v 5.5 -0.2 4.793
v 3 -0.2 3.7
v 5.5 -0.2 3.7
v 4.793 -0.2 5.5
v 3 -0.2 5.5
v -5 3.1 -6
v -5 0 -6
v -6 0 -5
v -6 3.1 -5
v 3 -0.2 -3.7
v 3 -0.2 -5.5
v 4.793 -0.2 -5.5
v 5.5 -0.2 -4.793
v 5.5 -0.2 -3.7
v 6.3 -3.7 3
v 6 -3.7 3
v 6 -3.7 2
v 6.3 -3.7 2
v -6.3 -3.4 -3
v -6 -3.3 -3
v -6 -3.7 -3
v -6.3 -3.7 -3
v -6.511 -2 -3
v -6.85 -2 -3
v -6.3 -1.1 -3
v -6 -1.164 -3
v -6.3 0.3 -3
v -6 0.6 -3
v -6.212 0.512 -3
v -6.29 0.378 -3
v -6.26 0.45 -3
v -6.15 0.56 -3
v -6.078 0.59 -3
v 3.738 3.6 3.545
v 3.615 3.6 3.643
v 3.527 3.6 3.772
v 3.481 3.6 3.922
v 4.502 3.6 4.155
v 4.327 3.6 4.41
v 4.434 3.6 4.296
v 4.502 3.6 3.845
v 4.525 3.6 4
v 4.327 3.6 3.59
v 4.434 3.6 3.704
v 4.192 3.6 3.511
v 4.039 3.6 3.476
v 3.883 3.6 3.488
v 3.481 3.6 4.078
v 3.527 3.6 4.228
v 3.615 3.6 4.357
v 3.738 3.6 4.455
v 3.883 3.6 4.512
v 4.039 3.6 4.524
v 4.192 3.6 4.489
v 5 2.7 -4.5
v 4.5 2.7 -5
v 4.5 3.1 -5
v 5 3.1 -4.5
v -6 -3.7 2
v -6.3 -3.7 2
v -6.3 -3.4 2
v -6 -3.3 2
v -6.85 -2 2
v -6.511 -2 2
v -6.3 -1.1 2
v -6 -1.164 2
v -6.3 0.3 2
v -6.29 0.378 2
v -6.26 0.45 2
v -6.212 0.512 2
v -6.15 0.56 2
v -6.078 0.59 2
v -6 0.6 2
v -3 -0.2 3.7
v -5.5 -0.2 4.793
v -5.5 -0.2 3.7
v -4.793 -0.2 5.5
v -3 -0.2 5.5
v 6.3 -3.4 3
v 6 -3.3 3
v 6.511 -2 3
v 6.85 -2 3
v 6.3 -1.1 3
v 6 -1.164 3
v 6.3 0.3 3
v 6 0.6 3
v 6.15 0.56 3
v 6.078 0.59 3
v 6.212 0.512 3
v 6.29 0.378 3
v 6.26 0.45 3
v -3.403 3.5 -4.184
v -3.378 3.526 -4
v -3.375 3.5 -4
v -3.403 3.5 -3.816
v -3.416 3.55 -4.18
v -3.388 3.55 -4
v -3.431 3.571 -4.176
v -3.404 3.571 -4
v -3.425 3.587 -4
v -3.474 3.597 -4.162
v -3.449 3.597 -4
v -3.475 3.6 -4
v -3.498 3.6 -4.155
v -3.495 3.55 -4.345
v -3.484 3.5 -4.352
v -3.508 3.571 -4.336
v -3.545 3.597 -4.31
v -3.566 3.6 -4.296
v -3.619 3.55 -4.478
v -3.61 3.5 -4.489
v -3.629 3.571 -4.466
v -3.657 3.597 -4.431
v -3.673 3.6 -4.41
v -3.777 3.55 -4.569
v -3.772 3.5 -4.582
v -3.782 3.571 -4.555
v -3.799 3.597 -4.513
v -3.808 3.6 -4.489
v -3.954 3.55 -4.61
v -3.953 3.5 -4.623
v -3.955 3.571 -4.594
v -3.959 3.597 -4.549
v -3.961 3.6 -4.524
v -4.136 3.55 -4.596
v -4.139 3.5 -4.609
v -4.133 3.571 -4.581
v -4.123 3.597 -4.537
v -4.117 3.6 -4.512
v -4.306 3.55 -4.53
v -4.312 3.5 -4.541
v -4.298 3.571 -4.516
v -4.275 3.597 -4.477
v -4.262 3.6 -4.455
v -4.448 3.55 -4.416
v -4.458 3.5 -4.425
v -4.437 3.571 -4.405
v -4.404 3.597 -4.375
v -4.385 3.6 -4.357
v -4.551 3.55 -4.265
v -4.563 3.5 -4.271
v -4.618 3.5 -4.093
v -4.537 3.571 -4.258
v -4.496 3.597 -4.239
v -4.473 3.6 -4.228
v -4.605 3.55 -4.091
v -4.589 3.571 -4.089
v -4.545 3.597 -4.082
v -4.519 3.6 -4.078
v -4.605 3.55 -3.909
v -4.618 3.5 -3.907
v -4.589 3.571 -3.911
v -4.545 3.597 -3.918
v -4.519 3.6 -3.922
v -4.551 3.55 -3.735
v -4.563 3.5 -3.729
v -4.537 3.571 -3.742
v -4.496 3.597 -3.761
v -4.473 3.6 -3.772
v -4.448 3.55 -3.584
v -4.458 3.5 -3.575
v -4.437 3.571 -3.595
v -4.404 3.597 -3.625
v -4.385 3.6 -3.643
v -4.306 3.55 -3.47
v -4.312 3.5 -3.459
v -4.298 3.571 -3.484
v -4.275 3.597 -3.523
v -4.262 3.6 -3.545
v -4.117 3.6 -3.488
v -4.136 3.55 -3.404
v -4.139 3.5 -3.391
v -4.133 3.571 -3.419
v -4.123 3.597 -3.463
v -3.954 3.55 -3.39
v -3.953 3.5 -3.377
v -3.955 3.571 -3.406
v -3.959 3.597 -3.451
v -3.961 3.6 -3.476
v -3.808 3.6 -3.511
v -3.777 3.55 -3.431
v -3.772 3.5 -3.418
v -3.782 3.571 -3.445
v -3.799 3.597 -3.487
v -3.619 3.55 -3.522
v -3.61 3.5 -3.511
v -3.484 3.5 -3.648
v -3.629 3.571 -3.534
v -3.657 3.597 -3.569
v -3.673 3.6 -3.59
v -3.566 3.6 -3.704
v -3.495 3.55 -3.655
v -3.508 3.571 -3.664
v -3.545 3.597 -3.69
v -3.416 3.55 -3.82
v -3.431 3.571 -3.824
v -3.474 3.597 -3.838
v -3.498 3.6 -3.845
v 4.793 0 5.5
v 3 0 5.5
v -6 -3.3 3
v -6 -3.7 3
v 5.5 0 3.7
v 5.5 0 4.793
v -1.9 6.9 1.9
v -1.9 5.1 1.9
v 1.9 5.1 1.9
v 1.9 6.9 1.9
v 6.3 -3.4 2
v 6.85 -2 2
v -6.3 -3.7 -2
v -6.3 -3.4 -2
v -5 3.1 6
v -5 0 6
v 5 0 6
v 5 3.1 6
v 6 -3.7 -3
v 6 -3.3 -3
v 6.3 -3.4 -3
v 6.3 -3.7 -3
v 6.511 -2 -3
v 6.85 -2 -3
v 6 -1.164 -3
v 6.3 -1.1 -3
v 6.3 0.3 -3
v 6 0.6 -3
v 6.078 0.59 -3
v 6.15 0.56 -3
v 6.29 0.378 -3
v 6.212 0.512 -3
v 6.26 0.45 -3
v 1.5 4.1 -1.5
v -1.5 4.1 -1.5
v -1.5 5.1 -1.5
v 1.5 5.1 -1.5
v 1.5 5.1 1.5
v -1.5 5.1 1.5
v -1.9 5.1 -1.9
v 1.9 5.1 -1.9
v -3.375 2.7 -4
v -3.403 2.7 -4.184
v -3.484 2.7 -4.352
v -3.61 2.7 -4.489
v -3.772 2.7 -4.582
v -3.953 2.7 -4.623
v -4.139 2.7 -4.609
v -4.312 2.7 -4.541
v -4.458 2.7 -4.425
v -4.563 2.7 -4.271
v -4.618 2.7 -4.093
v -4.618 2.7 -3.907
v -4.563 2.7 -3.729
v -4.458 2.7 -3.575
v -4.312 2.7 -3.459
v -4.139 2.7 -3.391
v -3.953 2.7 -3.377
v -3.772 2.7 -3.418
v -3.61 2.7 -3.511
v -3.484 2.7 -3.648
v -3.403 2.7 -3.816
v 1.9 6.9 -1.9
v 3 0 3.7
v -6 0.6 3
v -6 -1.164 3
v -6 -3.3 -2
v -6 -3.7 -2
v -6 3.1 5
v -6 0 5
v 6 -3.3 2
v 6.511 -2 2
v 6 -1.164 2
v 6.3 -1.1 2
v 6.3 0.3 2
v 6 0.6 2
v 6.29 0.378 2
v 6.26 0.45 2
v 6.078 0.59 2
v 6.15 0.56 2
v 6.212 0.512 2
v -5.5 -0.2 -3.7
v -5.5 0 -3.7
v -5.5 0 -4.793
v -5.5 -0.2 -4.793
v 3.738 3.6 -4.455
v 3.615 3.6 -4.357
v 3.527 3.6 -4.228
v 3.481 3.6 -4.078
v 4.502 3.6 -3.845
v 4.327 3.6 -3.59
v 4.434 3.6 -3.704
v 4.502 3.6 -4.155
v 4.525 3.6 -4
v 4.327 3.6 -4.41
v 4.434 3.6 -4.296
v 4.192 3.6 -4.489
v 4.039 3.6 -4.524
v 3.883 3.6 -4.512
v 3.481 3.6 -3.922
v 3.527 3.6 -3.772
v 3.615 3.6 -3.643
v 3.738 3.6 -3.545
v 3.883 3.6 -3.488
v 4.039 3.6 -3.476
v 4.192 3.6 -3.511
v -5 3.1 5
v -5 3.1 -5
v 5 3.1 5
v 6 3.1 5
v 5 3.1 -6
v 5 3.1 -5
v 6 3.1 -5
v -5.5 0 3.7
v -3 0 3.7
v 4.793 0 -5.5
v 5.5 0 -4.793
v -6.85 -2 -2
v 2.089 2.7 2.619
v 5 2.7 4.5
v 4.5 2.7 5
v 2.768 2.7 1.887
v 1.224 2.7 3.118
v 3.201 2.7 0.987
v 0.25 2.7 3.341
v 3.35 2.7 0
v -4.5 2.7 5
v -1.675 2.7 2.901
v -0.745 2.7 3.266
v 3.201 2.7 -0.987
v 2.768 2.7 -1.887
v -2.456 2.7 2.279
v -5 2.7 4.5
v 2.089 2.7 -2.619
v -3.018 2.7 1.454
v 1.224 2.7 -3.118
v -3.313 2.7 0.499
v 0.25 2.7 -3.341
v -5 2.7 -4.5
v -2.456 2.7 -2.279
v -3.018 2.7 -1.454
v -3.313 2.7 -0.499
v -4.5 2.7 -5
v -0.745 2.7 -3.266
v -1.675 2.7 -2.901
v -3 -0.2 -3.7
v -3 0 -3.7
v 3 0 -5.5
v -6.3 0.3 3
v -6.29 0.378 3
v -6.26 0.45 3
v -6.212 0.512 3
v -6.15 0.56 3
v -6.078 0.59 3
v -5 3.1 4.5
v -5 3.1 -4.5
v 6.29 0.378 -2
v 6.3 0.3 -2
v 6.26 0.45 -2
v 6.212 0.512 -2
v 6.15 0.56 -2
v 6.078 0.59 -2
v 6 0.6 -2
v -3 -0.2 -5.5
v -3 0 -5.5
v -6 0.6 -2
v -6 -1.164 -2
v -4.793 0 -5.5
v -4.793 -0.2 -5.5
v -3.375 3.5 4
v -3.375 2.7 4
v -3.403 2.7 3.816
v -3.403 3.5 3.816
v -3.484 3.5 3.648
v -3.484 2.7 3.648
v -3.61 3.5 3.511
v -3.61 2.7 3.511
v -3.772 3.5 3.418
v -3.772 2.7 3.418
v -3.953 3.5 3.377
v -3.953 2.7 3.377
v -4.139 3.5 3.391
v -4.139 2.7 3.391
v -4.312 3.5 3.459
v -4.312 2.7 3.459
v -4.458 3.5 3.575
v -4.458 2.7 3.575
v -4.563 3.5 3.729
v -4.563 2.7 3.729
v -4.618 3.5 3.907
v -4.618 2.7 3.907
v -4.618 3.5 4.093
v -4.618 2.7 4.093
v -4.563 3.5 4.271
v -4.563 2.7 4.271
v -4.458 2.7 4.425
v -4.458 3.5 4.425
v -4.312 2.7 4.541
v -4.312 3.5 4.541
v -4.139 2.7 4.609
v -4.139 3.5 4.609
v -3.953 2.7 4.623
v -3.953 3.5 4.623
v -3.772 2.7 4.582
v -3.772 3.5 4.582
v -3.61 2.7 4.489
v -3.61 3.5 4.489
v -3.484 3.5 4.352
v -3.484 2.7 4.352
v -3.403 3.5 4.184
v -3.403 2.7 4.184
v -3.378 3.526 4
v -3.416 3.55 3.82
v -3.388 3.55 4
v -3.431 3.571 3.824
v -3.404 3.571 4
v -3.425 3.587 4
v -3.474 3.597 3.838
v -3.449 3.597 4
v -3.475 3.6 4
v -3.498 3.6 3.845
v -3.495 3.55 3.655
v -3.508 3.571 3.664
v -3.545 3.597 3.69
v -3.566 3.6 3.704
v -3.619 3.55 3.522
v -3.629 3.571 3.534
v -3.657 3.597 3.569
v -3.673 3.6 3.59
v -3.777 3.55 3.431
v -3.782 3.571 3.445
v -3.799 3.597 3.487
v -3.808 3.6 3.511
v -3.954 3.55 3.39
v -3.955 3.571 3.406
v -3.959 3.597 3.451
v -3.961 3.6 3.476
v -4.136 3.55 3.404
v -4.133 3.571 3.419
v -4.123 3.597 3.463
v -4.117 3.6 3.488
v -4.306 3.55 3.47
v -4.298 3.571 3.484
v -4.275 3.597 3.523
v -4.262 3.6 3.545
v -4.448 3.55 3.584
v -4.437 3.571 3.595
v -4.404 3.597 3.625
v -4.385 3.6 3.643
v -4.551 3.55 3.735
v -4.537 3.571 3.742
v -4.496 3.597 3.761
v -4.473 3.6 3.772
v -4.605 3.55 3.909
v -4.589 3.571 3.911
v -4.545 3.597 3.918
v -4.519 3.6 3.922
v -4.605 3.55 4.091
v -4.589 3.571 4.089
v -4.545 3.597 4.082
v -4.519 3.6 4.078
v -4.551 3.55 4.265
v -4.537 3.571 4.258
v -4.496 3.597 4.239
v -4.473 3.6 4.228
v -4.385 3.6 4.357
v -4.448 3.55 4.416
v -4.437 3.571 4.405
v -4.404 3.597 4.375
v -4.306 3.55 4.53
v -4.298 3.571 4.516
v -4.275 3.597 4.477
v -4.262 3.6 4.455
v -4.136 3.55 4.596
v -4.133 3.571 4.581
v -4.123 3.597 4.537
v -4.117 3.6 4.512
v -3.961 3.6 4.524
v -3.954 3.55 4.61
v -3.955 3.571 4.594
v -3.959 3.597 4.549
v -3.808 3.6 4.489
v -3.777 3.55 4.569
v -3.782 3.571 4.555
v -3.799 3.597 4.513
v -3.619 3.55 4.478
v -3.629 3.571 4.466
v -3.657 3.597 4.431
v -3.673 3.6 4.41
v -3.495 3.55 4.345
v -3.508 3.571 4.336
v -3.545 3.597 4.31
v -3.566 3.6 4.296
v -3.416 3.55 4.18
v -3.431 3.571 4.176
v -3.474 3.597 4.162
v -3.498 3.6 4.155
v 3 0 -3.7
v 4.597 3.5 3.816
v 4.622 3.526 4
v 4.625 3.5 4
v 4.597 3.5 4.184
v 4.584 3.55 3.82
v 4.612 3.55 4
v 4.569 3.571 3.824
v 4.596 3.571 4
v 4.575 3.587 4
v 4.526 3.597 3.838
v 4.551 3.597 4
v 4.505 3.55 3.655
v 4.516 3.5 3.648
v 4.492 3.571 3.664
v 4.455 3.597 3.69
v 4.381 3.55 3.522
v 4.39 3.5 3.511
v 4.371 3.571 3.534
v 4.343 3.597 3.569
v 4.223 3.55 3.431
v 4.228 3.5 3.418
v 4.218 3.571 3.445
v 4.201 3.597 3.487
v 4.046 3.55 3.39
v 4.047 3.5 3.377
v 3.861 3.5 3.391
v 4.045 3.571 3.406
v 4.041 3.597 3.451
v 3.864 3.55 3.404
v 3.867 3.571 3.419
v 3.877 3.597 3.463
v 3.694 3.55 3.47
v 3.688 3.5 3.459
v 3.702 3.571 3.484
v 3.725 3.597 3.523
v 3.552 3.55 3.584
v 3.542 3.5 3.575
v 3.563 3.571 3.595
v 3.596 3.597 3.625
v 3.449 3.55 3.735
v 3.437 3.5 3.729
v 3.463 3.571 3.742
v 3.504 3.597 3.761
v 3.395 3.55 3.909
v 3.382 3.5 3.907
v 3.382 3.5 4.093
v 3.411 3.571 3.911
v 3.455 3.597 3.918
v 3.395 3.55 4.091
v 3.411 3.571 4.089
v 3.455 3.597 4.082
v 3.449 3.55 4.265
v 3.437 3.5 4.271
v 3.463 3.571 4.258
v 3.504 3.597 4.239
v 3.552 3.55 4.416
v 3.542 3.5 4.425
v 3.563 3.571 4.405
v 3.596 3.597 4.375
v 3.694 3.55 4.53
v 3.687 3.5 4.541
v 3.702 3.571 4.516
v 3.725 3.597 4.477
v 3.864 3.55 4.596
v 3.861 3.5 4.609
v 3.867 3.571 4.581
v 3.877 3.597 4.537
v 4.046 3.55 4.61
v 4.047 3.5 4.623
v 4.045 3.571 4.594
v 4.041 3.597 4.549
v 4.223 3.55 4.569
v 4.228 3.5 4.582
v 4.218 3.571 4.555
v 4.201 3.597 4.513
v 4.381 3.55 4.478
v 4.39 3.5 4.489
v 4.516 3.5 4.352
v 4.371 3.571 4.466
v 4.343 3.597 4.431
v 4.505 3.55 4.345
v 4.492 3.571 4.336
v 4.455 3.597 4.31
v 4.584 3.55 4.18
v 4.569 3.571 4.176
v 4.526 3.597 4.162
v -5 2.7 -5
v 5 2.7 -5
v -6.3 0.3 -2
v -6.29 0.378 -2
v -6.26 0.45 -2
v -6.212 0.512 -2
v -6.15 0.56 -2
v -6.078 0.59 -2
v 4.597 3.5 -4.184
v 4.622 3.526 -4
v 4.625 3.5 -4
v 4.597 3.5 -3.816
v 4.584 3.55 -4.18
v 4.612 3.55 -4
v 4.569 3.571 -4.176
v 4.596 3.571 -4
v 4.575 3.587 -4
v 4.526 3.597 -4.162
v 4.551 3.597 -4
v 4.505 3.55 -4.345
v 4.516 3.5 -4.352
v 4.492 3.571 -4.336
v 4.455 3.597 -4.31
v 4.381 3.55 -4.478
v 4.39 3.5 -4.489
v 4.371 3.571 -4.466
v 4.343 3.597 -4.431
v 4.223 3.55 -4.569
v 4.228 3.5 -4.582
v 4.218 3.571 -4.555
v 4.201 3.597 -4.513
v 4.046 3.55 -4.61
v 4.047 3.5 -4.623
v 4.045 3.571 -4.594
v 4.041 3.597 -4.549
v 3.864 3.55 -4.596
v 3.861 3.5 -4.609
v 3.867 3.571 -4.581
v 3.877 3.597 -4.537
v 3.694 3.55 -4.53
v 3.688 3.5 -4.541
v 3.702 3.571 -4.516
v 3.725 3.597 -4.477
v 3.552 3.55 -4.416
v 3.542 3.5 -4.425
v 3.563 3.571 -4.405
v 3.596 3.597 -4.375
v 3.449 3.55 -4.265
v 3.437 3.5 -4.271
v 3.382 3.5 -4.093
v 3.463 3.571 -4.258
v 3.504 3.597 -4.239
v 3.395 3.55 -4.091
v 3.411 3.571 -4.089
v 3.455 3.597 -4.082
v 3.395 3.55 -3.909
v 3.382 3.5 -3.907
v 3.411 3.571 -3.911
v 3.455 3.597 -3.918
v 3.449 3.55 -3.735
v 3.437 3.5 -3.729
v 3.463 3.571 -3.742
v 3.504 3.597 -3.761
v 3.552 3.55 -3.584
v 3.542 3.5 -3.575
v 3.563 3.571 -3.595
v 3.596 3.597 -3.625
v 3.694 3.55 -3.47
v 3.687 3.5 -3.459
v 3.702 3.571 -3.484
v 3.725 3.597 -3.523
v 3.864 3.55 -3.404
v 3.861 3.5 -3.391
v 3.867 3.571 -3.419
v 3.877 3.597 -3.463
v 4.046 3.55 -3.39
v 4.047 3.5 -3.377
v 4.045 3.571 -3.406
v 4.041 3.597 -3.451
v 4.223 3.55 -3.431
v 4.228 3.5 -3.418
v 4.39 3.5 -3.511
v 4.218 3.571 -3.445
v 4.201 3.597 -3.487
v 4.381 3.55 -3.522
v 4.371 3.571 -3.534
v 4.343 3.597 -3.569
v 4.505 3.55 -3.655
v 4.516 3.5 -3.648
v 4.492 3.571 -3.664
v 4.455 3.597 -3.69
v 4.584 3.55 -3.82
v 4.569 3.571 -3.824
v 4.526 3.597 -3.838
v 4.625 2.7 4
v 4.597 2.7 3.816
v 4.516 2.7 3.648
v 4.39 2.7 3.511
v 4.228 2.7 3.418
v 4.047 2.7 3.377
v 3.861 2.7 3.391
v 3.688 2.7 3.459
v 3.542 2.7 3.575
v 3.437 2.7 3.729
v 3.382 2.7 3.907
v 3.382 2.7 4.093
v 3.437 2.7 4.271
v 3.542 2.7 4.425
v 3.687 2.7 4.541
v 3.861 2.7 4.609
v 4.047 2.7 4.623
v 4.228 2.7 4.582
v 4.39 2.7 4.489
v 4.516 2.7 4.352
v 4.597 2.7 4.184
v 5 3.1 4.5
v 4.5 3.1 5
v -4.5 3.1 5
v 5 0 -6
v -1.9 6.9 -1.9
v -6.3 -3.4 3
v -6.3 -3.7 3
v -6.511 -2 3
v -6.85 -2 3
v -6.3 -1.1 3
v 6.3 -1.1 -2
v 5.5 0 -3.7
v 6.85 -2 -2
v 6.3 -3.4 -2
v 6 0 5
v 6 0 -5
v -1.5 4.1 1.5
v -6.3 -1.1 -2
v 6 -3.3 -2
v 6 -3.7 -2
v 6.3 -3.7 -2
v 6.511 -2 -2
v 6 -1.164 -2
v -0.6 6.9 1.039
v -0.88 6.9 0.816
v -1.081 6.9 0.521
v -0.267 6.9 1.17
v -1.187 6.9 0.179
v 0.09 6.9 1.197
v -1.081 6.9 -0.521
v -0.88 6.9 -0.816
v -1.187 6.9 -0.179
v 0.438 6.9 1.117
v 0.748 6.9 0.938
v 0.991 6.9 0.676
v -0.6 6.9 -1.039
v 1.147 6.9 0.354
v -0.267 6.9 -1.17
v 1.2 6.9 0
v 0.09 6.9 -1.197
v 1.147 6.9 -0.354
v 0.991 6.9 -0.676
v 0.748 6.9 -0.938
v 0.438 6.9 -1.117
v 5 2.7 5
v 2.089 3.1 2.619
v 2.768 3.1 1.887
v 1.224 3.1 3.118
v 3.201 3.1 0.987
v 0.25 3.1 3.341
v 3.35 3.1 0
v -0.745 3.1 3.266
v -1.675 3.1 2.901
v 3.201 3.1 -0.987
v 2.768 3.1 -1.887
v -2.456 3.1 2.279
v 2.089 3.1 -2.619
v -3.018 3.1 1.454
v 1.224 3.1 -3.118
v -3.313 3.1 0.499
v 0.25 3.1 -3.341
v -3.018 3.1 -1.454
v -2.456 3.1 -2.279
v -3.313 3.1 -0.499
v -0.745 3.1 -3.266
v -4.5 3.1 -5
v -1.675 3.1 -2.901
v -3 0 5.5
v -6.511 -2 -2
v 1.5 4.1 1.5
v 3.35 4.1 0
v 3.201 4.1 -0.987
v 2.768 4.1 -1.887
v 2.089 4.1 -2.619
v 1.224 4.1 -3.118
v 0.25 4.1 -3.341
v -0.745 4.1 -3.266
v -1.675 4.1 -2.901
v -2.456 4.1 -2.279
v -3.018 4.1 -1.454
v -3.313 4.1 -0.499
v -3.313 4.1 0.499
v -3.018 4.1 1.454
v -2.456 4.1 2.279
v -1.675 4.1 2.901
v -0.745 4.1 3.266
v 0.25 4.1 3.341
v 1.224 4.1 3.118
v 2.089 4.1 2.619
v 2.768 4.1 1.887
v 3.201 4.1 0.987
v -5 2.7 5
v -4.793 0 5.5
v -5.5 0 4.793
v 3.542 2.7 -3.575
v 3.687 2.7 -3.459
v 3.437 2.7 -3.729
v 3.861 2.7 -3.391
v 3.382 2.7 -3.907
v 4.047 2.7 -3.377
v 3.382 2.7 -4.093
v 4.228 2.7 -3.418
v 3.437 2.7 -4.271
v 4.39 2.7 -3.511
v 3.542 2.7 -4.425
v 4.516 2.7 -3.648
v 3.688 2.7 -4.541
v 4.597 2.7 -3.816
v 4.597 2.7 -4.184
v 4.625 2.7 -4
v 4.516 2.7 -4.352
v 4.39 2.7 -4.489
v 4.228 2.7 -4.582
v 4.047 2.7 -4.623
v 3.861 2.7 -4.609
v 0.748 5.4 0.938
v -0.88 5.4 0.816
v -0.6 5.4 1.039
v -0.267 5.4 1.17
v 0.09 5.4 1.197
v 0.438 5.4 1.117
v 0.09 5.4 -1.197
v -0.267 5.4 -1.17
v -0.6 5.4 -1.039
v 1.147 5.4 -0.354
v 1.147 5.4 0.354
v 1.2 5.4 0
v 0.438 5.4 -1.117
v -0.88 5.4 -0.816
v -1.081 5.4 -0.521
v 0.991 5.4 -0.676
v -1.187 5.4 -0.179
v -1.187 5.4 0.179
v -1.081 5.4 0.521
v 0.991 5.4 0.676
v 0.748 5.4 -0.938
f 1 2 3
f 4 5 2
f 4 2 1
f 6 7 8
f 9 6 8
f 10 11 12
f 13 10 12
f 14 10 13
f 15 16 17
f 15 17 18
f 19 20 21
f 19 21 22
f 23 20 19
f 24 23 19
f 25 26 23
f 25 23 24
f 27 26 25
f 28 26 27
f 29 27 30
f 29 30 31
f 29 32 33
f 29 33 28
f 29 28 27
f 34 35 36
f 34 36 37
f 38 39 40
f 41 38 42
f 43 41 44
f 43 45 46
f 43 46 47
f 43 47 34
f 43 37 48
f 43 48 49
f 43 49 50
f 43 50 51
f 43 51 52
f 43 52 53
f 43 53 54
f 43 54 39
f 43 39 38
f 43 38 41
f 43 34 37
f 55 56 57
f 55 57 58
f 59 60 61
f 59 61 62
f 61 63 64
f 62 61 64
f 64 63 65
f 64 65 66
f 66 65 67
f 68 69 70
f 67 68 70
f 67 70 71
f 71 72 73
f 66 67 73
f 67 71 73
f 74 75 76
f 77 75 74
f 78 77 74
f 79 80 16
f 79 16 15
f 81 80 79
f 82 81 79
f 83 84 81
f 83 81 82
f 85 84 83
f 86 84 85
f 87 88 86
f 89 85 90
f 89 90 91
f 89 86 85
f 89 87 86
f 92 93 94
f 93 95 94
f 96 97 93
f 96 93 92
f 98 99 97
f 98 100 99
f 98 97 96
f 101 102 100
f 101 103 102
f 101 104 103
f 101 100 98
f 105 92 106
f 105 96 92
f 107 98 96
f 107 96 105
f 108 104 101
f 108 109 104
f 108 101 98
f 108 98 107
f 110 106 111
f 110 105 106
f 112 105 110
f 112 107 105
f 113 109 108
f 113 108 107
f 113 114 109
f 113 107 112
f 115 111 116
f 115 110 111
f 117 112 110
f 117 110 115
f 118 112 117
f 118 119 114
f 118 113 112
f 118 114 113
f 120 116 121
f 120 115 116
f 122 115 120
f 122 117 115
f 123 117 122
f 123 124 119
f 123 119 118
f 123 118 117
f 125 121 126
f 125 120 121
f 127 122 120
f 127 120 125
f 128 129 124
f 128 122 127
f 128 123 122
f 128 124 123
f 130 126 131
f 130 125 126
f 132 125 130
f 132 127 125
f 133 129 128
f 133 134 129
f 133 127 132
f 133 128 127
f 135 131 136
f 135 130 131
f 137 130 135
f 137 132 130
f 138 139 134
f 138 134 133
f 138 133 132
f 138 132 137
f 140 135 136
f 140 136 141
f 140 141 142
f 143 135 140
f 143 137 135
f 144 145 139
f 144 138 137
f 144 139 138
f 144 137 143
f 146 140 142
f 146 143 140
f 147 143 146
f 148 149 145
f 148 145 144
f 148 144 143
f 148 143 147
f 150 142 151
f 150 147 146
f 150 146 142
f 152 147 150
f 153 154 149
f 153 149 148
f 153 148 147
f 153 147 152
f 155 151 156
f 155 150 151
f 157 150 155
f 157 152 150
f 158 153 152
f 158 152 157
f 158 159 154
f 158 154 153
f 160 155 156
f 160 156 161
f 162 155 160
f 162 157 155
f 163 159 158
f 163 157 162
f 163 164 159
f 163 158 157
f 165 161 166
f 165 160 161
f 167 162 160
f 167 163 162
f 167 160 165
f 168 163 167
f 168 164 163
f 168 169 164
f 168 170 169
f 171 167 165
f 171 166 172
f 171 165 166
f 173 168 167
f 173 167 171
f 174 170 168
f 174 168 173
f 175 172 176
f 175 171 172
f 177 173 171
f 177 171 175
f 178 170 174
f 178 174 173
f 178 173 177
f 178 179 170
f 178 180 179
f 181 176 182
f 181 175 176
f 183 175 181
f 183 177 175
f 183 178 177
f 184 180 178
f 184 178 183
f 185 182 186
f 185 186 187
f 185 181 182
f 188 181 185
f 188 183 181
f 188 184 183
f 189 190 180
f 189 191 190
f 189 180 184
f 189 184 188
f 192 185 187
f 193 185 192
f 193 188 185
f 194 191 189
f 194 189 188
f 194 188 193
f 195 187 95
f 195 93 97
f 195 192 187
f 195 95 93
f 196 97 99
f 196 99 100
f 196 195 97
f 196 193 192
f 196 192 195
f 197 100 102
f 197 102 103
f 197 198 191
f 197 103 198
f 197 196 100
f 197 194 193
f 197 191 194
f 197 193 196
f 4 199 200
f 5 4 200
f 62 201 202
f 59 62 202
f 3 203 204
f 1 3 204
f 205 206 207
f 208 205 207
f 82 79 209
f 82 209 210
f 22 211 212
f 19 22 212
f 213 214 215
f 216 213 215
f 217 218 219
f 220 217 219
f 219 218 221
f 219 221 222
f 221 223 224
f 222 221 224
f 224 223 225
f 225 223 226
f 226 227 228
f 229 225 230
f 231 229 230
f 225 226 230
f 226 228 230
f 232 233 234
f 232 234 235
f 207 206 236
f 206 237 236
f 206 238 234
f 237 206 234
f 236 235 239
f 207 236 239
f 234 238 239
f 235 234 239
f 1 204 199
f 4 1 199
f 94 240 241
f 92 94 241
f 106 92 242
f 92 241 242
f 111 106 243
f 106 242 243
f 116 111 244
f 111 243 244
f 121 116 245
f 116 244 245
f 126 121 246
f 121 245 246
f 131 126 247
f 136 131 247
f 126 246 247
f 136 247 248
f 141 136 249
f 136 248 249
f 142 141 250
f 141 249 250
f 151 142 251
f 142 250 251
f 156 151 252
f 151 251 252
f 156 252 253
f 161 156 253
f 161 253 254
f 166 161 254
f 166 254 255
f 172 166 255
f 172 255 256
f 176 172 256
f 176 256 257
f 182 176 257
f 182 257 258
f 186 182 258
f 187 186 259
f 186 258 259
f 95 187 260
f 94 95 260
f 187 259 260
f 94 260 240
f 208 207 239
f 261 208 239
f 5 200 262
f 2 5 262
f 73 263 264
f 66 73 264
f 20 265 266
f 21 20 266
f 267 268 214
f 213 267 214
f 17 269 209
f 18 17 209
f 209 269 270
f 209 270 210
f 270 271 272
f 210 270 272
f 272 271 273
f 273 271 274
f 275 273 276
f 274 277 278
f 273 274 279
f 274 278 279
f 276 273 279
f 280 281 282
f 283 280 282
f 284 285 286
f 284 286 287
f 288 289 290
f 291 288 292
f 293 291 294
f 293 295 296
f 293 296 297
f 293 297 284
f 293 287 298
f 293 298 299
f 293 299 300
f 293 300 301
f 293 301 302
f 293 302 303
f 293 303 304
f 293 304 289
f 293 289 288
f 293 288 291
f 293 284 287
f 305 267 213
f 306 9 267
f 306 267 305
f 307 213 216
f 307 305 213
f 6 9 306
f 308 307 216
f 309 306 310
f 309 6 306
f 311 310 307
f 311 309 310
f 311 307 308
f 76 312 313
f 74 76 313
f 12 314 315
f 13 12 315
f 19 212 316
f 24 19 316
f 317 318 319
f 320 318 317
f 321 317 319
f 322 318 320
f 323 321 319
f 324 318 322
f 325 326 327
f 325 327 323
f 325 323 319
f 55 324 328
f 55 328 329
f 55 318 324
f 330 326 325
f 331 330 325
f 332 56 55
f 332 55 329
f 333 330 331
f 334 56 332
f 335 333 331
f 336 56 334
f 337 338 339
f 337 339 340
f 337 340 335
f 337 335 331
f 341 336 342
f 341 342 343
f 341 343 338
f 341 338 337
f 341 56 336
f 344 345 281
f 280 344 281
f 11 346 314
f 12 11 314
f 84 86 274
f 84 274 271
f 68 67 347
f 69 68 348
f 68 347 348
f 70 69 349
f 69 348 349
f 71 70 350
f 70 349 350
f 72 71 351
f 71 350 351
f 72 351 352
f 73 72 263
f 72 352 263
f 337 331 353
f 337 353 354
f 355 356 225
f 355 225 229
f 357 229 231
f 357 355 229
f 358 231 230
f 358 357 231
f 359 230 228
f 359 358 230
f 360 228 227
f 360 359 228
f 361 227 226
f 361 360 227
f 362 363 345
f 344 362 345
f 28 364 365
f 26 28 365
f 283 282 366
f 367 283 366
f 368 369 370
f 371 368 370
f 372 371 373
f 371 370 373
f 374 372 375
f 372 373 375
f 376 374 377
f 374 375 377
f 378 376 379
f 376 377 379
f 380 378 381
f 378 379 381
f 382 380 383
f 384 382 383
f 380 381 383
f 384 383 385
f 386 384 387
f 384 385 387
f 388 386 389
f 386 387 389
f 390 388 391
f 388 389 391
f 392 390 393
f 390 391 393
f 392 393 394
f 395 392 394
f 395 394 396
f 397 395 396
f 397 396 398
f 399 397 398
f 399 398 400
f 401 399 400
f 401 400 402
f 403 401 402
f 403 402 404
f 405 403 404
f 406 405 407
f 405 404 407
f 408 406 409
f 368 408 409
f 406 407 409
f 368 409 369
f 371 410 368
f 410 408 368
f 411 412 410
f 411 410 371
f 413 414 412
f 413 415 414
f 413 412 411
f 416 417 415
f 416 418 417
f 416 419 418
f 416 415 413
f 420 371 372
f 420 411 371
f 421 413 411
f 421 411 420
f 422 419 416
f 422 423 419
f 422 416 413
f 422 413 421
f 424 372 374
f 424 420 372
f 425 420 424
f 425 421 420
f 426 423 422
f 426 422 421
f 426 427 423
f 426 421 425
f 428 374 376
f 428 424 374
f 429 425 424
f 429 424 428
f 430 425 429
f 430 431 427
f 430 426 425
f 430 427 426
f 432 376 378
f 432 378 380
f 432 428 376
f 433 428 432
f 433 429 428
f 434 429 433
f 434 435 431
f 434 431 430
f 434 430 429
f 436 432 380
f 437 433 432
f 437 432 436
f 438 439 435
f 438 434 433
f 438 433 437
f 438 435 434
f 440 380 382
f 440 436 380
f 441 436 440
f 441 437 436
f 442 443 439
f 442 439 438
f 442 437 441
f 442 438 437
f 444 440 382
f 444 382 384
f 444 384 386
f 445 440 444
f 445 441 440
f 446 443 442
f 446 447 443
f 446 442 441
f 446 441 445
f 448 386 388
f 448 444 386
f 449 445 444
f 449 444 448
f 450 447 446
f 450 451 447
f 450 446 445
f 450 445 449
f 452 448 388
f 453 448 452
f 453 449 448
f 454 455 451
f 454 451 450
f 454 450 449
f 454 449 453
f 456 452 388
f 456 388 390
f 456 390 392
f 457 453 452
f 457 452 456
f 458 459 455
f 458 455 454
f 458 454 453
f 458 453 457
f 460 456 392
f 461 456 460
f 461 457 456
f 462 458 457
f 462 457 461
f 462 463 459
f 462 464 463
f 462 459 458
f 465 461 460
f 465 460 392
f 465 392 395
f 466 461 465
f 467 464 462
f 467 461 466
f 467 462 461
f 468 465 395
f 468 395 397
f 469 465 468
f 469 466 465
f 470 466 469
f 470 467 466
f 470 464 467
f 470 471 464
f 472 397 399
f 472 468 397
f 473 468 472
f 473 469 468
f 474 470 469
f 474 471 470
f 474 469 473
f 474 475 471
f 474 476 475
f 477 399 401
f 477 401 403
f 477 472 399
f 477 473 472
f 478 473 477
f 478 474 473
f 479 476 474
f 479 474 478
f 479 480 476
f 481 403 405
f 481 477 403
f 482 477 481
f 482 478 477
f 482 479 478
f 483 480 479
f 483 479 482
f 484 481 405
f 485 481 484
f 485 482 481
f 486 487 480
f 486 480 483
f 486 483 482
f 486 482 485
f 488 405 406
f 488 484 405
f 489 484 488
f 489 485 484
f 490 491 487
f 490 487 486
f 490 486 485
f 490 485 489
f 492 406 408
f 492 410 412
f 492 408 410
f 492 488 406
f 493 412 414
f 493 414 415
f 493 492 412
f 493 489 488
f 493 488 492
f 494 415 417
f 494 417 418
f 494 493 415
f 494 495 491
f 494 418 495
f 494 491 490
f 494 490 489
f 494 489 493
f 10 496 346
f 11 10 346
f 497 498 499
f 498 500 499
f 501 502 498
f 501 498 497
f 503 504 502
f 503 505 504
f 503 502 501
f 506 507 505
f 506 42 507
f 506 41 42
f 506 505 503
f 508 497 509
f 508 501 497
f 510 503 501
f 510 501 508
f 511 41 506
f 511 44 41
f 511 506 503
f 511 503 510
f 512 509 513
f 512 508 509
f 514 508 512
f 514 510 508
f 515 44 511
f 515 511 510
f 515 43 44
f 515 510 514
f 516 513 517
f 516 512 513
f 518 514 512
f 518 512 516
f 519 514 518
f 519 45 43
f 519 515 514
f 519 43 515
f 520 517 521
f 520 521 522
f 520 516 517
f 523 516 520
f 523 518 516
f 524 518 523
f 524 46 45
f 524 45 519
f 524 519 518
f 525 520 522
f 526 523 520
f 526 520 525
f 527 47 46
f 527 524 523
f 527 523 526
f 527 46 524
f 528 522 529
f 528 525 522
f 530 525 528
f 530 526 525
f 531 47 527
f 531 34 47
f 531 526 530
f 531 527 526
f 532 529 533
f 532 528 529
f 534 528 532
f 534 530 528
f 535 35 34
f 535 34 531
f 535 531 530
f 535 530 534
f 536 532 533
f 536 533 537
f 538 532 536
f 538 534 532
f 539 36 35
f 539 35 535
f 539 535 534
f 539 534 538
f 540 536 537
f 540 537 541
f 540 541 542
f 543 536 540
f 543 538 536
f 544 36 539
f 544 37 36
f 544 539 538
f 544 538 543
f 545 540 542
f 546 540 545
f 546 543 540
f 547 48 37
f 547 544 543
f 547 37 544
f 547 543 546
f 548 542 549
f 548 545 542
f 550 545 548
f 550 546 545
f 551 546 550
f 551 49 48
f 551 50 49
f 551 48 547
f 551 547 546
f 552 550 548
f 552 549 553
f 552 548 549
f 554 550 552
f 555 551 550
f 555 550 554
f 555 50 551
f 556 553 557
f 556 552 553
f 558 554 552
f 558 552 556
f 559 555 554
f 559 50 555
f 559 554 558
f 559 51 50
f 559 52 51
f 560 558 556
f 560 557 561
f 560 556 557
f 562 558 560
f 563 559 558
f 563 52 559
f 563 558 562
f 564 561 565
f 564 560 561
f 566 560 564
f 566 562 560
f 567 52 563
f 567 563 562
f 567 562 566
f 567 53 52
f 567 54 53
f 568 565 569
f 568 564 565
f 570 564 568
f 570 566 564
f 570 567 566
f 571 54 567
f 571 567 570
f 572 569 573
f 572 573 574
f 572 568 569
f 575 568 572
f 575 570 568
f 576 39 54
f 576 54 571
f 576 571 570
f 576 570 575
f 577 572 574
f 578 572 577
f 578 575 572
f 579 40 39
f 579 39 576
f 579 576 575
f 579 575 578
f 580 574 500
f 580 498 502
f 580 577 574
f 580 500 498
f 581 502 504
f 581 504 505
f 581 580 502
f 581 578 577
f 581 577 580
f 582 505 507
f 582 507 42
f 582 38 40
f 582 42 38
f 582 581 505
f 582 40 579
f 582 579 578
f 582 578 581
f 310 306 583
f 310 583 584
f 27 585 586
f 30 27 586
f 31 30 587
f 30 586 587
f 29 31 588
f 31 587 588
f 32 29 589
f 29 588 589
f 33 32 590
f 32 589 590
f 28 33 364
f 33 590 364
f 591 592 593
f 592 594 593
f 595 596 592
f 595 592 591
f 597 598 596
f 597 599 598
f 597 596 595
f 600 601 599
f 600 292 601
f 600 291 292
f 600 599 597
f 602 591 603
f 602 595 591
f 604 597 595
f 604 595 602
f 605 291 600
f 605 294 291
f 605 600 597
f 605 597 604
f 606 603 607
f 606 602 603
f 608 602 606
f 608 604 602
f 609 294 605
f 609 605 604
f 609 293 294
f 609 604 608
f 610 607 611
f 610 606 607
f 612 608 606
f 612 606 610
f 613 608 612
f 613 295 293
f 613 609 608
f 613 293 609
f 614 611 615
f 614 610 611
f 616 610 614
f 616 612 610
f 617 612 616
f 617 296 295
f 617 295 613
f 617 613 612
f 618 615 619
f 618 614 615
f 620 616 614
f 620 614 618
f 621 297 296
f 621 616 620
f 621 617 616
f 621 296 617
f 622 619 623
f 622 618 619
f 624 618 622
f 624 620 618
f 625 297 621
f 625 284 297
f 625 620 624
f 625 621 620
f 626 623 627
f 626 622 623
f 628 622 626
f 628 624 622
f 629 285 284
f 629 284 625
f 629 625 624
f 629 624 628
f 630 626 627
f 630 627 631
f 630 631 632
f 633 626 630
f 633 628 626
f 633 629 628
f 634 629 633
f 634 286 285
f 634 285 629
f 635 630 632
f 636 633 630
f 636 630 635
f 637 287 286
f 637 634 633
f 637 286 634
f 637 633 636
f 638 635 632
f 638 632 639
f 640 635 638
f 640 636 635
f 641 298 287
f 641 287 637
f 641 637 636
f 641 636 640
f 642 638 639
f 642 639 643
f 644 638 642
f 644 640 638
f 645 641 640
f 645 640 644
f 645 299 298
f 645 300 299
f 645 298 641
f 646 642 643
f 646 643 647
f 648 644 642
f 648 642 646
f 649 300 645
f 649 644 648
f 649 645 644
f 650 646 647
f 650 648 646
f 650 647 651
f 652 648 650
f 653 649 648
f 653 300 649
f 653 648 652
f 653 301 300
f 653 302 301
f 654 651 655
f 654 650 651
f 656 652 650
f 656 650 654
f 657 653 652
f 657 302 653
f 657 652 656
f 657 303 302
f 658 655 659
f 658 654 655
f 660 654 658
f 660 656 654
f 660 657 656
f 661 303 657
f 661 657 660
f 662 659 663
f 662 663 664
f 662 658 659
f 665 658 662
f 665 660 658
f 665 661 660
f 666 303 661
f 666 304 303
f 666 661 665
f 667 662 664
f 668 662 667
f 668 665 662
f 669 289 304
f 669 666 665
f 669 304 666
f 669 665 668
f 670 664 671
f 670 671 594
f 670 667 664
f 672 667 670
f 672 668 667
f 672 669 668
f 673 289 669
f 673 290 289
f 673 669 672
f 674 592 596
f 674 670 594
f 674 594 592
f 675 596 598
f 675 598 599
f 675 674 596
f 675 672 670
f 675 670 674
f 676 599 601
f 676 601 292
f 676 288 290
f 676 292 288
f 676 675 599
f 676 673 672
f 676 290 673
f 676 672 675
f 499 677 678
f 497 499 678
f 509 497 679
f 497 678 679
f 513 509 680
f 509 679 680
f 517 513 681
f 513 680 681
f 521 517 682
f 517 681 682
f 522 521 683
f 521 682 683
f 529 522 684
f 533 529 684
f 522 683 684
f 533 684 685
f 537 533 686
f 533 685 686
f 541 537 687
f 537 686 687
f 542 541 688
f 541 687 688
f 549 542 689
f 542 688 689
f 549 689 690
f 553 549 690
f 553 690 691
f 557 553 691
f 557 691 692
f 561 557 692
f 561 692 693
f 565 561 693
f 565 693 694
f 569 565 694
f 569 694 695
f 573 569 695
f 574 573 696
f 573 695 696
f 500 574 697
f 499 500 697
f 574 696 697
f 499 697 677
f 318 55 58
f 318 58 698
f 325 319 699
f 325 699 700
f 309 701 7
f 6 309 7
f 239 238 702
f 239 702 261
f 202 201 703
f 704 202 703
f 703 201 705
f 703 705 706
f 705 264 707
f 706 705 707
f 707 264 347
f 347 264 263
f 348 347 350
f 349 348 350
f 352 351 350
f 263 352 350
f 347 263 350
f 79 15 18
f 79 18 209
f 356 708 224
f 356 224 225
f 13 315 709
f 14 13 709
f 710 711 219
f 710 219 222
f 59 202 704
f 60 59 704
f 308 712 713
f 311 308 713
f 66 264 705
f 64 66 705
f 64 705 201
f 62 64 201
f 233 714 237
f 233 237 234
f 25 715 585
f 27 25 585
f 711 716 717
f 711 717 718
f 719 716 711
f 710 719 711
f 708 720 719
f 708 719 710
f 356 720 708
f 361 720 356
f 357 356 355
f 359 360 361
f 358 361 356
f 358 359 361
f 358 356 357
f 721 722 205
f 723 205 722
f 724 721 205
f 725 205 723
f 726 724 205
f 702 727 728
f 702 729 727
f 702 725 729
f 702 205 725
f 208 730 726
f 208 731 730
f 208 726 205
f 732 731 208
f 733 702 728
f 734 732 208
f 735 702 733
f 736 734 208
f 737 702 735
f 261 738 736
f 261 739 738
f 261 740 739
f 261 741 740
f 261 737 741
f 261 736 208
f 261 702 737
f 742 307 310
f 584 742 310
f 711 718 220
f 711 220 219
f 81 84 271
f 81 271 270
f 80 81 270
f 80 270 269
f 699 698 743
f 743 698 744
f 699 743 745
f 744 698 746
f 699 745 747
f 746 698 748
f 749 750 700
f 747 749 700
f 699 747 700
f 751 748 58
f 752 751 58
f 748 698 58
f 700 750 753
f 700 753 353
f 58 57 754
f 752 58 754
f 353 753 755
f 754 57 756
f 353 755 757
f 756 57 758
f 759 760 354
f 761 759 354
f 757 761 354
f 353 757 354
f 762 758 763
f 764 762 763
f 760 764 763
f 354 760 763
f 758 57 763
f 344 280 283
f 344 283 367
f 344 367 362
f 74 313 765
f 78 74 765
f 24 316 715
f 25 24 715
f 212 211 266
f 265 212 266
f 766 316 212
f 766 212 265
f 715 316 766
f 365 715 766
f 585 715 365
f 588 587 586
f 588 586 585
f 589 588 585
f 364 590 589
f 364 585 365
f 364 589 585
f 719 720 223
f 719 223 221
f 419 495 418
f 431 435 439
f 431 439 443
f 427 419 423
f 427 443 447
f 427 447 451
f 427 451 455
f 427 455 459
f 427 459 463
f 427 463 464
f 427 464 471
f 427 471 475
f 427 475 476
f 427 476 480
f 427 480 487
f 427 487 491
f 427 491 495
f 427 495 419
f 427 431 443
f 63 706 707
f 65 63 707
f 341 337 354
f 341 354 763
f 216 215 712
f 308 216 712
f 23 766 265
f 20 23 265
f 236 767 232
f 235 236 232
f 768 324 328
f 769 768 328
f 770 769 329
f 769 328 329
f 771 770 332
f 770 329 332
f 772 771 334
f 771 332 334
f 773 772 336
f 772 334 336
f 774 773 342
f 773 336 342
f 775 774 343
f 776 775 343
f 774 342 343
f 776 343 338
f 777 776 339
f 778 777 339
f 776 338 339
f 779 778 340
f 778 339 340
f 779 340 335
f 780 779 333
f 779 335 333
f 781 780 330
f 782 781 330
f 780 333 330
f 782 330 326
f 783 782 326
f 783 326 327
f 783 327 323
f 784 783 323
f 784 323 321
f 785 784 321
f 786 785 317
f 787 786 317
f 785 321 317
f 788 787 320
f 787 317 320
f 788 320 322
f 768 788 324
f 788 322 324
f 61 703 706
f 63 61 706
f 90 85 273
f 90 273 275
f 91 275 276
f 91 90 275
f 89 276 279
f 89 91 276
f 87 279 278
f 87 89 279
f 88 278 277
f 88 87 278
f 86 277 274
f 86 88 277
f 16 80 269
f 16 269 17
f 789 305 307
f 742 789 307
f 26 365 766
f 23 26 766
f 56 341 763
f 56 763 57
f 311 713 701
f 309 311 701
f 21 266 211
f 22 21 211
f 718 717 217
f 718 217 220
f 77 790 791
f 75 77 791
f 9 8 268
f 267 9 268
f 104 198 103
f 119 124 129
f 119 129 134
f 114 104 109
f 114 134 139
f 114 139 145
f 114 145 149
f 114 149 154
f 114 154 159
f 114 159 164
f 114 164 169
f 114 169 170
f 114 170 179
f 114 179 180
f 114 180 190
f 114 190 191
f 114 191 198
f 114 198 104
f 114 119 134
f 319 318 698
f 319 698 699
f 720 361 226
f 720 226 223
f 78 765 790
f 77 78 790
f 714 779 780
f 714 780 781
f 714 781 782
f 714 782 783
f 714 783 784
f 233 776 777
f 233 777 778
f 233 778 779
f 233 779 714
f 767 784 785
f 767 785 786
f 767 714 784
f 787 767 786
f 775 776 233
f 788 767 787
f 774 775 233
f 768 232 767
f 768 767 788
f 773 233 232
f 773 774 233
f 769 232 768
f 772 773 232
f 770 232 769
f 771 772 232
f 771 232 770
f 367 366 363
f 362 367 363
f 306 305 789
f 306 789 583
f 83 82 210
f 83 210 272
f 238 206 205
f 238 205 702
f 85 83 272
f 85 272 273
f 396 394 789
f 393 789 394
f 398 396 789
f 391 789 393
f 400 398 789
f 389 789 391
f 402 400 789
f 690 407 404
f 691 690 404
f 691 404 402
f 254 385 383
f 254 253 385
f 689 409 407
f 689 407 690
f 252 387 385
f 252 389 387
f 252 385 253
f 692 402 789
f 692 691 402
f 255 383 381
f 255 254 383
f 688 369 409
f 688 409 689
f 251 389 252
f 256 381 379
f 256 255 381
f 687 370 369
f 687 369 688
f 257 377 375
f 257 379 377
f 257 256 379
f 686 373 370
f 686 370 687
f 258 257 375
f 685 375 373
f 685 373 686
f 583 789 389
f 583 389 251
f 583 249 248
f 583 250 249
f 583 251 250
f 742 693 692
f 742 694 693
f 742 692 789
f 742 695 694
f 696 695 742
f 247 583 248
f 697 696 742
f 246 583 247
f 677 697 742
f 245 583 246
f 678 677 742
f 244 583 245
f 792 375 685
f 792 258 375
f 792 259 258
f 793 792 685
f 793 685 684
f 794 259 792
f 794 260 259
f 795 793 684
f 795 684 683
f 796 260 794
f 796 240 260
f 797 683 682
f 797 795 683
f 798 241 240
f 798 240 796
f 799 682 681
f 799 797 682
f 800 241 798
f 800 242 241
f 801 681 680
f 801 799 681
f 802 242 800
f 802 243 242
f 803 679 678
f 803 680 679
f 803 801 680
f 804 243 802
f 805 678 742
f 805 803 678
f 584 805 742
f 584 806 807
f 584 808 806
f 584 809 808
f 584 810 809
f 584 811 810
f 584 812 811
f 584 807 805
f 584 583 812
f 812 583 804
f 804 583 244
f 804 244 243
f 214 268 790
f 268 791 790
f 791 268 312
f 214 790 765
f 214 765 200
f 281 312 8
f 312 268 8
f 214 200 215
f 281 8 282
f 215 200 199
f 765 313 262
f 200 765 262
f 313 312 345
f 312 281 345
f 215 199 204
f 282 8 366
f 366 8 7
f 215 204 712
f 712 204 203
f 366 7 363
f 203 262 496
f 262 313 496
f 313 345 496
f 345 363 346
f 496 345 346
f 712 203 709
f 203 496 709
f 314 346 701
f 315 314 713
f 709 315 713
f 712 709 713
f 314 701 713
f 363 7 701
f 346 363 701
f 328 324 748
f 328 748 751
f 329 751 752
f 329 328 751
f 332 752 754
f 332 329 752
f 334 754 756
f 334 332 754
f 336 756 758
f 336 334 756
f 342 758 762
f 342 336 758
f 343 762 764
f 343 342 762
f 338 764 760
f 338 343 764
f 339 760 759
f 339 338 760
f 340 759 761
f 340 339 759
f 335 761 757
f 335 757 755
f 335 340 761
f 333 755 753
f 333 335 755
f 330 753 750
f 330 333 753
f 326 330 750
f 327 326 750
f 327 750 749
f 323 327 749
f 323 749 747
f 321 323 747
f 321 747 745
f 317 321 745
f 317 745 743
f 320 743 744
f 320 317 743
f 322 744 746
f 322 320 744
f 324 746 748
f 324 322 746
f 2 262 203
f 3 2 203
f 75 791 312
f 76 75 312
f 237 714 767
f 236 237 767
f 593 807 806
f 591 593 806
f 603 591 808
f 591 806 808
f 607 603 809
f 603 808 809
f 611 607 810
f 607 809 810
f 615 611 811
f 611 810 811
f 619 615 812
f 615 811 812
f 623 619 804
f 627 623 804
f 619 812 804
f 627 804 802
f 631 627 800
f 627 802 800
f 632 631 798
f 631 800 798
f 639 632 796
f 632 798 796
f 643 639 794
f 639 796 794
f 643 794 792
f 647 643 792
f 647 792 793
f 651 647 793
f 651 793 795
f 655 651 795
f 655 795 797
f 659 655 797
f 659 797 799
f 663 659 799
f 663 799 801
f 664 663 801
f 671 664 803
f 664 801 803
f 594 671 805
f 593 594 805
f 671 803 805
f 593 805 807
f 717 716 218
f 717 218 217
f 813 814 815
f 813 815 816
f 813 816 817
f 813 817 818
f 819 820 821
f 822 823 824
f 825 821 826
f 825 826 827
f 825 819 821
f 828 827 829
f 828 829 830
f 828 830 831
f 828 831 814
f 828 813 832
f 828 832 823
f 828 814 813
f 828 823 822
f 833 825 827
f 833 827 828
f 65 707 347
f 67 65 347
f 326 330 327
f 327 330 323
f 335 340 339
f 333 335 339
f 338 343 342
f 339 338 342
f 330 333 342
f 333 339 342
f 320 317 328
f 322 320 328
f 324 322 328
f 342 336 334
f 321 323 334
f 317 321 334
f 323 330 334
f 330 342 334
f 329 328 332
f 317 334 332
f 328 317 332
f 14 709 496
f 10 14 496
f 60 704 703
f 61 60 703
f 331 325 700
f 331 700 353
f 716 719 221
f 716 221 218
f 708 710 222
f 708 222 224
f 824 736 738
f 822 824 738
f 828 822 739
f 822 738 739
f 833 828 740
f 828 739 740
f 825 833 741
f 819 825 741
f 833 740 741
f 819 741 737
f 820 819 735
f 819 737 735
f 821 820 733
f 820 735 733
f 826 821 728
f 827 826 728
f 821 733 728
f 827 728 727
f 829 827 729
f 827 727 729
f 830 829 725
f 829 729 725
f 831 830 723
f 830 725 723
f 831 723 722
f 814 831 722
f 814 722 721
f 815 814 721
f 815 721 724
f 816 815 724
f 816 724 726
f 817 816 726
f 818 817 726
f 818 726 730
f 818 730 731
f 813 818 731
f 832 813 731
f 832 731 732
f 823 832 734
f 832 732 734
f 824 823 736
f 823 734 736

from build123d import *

# Parameters (mm, degrees)
BOSS_EXTRUDE1_DEPTH        = 3.1
SKETCH2_W                  = 10
SKETCH2_H                  = 10
CUT_EXTRUDE1_DEPTH         = 0.4
SKETCH3_R                  = 0.625
BOSS_EXTRUDE2_DEPTH        = 0.9
FILLET1_R                  = 0.1
SKETCH4_R                  = 3.35
BOSS_EXTRUDE3_DEPTH        = 0.4
BOSS_EXTRUDE4_DEPTH        = 3
BOSS_EXTRUDE4_DEPTH_BACK   = 3
BOSS_EXTRUDE4_2_DEPTH      = 3
BOSS_EXTRUDE4_2_DEPTH_BACK = 3
SKETCH6_W                  = 0.85
SKETCH6_H                  = 4
CUT_EXTRUDE2_DEPTH         = 4.6
CUT_EXTRUDE2_DEPTH_BACK    = 4.7
SKETCH7_R                  = 3.35
BOSS_EXTRUDE5_DEPTH        = 1.4
SKETCH8_W                  = 3
SKETCH8_H                  = 3
BOSS_EXTRUDE6_DEPTH        = 1
SKETCH9_W                  = 3.8
SKETCH9_H                  = 3.8
BOSS_EXTRUDE7_DEPTH        = 1.8
SKETCH11_R                 = 1.2
CUT_EXTRUDE3_DEPTH         = 1.5
BOSS_EXTRUDE8_DEPTH        = 0.2


with BuildPart() as part:
    # Sketch1 → Boss-Extrude1 (new body)
    with BuildSketch(Plane(origin=(0, 0, 0), x_dir=(1, 0, 0), z_dir=(0, 1, 0))):
        Polygon((-5, 6), (-6, 5), (-6, -5), (-5, -6), (5, -6), (6, -5), (6, 5), (5, 6), align=None)
    extrude(amount=BOSS_EXTRUDE1_DEPTH)

    # Sketch2 → Cut-Extrude1 (cut)
    with BuildSketch(Plane(origin=(0, 3.1, 0), x_dir=(1, 0, 0), z_dir=(0, 1, 0))):
        Rectangle(SKETCH2_W, SKETCH2_H)
    extrude(amount=-CUT_EXTRUDE1_DEPTH, mode=Mode.SUBTRACT)

    # Sketch3 → Boss-Extrude2 (add)
    with BuildSketch(Plane(origin=(0, 2.7, 0), x_dir=(1, 0, 0), z_dir=(0, 1, 0))):
        with Locations((-4, 4)):
            Circle(SKETCH3_R)
        with Locations((4, 4)):
            Circle(SKETCH3_R)
        with Locations((-4, -4)):
            Circle(SKETCH3_R)
        with Locations((4, -4)):
            Circle(SKETCH3_R)
    extrude(amount=BOSS_EXTRUDE2_DEPTH)

    # Fillet1
    fillet1_edges = [part.edges().sort_by_distance(p)[0] for p in [
        (-4.625, 3.6, -4),
        (3.375, 3.6, -4),
        (-4.625, 3.6, 4),
        (3.375, 3.6, 4),
    ]]
    fillet(fillet1_edges, radius=FILLET1_R)

    # Sketch12 → Boss-Extrude8 (add)
    with BuildSketch(Plane.XZ):
        Polygon((3, 5.5), (3, 3.7), (5.5, 3.7), (5.5, 4.792893219), (4.792893219, 5.5), align=None)
        Polygon((4.792893219, -5.5), (5.5, -4.792893219), (5.5, -3.7), (3, -3.7), (3, -5.5), align=None)
        Polygon((-3, -5.5), (-3, -3.7), (-5.5, -3.7), (-5.5, -4.792893219), (-4.792893219, -5.5), align=None)
        Polygon((-4.792893219, 5.5), (-5.5, 4.792893219), (-5.5, 3.7), (-3, 3.7), (-3, 5.5), align=None)
    extrude(amount=BOSS_EXTRUDE8_DEPTH)


with BuildPart() as body_2:
    # Sketch4 → Boss-Extrude3 (new body)
    with BuildSketch(Plane(origin=(0, 2.7, 0), x_dir=(1, 0, 0), z_dir=(0, 1, 0))):
        Polygon((4.5, -5), (-4.5, -5), (-5, -4.5), (-5, 4.5), (-4.5, 5), (4.5, 5), (5, 4.5), (5, -4.5), align=None)
        Circle(SKETCH4_R, mode=Mode.SUBTRACT)
    extrude(amount=BOSS_EXTRUDE3_DEPTH)


with BuildPart() as body_3:
    # Sketch5 → Boss-Extrude4 (new body, two sides)
    with BuildSketch(Plane.XY) as boss_extrude4_sk:
        with BuildLine():
            Line((6, 0.6), (6, -1.164285714))
            Line((6, -1.164285714), (6.510714286, -2))
            Line((6.510714286, -2), (6, -3.3))
            Line((6, -3.3), (6, -3.7))
            Line((6, -3.7), (6.3, -3.7))
            Line((6.3, -3.7), (6.3, -3.4))
            Line((6.3, -3.4), (6.85, -2))
            Line((6.85, -2), (6.3, -1.1))
            Line((6.3, -1.1), (6.3, 0.3))
            ThreePointArc((6.3, 0.3), (6.212132034, 0.512132034), (6, 0.6))
        make_face()
    extrude(amount=BOSS_EXTRUDE4_DEPTH)
    extrude(boss_extrude4_sk.sketch, amount=-BOSS_EXTRUDE4_DEPTH_BACK)


with BuildPart() as body_4:
    # Sketch5 → Boss-Extrude4 2 (new body, two sides)
    with BuildSketch(Plane.XY) as boss_extrude4_2_sk:
        with BuildLine():
            Line((-6.510714286, -2), (-6, -3.3))
            Line((-6, -3.3), (-6, -3.7))
            Line((-6, -3.7), (-6.3, -3.7))
            Line((-6.3, -3.7), (-6.3, -3.4))
            Line((-6.3, -3.4), (-6.85, -2))
            Line((-6.85, -2), (-6.3, -1.1))
            Line((-6.3, -1.1), (-6.3, 0.3))
            ThreePointArc((-6.3, 0.3), (-6.212132034, 0.512132034), (-6, 0.6))
            Line((-6, 0.6), (-6, -1.164285714))
            Line((-6, -1.164285714), (-6.510714286, -2))
        make_face()
    extrude(amount=BOSS_EXTRUDE4_2_DEPTH)
    extrude(boss_extrude4_2_sk.sketch, amount=-BOSS_EXTRUDE4_2_DEPTH_BACK)


with BuildPart() as cut_extrude2_tool:
    # Sketch6 → Cut-Extrude2 (new body, two sides)
    with BuildSketch(Plane(origin=(0, 0, 0), x_dir=(1, 0, 0), z_dir=(0, 1, 0))) as cut_extrude2_sk:
        with Locations((-6.425, 0)):
            Rectangle(SKETCH6_W, SKETCH6_H)
        with Locations((6.425, 0)):
            Rectangle(SKETCH6_W, SKETCH6_H)
    extrude(amount=CUT_EXTRUDE2_DEPTH)
    extrude(cut_extrude2_sk.sketch, amount=-CUT_EXTRUDE2_DEPTH_BACK)


with BuildPart() as body_3_1:
    add(body_3.part)

    # Cut-Extrude2: cut by cut_extrude2_tool
    add(cut_extrude2_tool.part, mode=Mode.SUBTRACT)


with BuildPart() as body_4_1:
    add(body_4.part)

    # Cut-Extrude2: cut by cut_extrude2_tool
    add(cut_extrude2_tool.part, mode=Mode.SUBTRACT)


with BuildPart() as body_5:
    # Sketch7 → Boss-Extrude5 (new body)
    with BuildSketch(Plane(origin=(0, 2.7, 0), x_dir=(1, 0, 0), z_dir=(0, 1, 0))):
        Circle(SKETCH7_R)
    extrude(amount=BOSS_EXTRUDE5_DEPTH)

    # Sketch8 → Boss-Extrude6 (add)
    with BuildSketch(Plane(origin=(0, 4.1, 0), x_dir=(1, 0, 0), z_dir=(0, 1, 0))):
        Rectangle(SKETCH8_W, SKETCH8_H)
    extrude(amount=BOSS_EXTRUDE6_DEPTH)

    # Sketch9 → Boss-Extrude7 (add)
    with BuildSketch(Plane(origin=(0, 5.1, 0), x_dir=(1, 0, 0), z_dir=(0, 1, 0))):
        Rectangle(SKETCH9_W, SKETCH9_H)
    extrude(amount=BOSS_EXTRUDE7_DEPTH)

    # Sketch11 → Cut-Extrude3 (cut)
    with BuildSketch(Plane(origin=(0, 6.9, 0), x_dir=(1, 0, 0), z_dir=(0, 1, 0))):
        Circle(SKETCH11_R)
    extrude(amount=-CUT_EXTRUDE3_DEPTH, mode=Mode.SUBTRACT)


solid = Compound([part.part, body_2.part, body_3_1.part, body_4_1.part, body_5.part])
